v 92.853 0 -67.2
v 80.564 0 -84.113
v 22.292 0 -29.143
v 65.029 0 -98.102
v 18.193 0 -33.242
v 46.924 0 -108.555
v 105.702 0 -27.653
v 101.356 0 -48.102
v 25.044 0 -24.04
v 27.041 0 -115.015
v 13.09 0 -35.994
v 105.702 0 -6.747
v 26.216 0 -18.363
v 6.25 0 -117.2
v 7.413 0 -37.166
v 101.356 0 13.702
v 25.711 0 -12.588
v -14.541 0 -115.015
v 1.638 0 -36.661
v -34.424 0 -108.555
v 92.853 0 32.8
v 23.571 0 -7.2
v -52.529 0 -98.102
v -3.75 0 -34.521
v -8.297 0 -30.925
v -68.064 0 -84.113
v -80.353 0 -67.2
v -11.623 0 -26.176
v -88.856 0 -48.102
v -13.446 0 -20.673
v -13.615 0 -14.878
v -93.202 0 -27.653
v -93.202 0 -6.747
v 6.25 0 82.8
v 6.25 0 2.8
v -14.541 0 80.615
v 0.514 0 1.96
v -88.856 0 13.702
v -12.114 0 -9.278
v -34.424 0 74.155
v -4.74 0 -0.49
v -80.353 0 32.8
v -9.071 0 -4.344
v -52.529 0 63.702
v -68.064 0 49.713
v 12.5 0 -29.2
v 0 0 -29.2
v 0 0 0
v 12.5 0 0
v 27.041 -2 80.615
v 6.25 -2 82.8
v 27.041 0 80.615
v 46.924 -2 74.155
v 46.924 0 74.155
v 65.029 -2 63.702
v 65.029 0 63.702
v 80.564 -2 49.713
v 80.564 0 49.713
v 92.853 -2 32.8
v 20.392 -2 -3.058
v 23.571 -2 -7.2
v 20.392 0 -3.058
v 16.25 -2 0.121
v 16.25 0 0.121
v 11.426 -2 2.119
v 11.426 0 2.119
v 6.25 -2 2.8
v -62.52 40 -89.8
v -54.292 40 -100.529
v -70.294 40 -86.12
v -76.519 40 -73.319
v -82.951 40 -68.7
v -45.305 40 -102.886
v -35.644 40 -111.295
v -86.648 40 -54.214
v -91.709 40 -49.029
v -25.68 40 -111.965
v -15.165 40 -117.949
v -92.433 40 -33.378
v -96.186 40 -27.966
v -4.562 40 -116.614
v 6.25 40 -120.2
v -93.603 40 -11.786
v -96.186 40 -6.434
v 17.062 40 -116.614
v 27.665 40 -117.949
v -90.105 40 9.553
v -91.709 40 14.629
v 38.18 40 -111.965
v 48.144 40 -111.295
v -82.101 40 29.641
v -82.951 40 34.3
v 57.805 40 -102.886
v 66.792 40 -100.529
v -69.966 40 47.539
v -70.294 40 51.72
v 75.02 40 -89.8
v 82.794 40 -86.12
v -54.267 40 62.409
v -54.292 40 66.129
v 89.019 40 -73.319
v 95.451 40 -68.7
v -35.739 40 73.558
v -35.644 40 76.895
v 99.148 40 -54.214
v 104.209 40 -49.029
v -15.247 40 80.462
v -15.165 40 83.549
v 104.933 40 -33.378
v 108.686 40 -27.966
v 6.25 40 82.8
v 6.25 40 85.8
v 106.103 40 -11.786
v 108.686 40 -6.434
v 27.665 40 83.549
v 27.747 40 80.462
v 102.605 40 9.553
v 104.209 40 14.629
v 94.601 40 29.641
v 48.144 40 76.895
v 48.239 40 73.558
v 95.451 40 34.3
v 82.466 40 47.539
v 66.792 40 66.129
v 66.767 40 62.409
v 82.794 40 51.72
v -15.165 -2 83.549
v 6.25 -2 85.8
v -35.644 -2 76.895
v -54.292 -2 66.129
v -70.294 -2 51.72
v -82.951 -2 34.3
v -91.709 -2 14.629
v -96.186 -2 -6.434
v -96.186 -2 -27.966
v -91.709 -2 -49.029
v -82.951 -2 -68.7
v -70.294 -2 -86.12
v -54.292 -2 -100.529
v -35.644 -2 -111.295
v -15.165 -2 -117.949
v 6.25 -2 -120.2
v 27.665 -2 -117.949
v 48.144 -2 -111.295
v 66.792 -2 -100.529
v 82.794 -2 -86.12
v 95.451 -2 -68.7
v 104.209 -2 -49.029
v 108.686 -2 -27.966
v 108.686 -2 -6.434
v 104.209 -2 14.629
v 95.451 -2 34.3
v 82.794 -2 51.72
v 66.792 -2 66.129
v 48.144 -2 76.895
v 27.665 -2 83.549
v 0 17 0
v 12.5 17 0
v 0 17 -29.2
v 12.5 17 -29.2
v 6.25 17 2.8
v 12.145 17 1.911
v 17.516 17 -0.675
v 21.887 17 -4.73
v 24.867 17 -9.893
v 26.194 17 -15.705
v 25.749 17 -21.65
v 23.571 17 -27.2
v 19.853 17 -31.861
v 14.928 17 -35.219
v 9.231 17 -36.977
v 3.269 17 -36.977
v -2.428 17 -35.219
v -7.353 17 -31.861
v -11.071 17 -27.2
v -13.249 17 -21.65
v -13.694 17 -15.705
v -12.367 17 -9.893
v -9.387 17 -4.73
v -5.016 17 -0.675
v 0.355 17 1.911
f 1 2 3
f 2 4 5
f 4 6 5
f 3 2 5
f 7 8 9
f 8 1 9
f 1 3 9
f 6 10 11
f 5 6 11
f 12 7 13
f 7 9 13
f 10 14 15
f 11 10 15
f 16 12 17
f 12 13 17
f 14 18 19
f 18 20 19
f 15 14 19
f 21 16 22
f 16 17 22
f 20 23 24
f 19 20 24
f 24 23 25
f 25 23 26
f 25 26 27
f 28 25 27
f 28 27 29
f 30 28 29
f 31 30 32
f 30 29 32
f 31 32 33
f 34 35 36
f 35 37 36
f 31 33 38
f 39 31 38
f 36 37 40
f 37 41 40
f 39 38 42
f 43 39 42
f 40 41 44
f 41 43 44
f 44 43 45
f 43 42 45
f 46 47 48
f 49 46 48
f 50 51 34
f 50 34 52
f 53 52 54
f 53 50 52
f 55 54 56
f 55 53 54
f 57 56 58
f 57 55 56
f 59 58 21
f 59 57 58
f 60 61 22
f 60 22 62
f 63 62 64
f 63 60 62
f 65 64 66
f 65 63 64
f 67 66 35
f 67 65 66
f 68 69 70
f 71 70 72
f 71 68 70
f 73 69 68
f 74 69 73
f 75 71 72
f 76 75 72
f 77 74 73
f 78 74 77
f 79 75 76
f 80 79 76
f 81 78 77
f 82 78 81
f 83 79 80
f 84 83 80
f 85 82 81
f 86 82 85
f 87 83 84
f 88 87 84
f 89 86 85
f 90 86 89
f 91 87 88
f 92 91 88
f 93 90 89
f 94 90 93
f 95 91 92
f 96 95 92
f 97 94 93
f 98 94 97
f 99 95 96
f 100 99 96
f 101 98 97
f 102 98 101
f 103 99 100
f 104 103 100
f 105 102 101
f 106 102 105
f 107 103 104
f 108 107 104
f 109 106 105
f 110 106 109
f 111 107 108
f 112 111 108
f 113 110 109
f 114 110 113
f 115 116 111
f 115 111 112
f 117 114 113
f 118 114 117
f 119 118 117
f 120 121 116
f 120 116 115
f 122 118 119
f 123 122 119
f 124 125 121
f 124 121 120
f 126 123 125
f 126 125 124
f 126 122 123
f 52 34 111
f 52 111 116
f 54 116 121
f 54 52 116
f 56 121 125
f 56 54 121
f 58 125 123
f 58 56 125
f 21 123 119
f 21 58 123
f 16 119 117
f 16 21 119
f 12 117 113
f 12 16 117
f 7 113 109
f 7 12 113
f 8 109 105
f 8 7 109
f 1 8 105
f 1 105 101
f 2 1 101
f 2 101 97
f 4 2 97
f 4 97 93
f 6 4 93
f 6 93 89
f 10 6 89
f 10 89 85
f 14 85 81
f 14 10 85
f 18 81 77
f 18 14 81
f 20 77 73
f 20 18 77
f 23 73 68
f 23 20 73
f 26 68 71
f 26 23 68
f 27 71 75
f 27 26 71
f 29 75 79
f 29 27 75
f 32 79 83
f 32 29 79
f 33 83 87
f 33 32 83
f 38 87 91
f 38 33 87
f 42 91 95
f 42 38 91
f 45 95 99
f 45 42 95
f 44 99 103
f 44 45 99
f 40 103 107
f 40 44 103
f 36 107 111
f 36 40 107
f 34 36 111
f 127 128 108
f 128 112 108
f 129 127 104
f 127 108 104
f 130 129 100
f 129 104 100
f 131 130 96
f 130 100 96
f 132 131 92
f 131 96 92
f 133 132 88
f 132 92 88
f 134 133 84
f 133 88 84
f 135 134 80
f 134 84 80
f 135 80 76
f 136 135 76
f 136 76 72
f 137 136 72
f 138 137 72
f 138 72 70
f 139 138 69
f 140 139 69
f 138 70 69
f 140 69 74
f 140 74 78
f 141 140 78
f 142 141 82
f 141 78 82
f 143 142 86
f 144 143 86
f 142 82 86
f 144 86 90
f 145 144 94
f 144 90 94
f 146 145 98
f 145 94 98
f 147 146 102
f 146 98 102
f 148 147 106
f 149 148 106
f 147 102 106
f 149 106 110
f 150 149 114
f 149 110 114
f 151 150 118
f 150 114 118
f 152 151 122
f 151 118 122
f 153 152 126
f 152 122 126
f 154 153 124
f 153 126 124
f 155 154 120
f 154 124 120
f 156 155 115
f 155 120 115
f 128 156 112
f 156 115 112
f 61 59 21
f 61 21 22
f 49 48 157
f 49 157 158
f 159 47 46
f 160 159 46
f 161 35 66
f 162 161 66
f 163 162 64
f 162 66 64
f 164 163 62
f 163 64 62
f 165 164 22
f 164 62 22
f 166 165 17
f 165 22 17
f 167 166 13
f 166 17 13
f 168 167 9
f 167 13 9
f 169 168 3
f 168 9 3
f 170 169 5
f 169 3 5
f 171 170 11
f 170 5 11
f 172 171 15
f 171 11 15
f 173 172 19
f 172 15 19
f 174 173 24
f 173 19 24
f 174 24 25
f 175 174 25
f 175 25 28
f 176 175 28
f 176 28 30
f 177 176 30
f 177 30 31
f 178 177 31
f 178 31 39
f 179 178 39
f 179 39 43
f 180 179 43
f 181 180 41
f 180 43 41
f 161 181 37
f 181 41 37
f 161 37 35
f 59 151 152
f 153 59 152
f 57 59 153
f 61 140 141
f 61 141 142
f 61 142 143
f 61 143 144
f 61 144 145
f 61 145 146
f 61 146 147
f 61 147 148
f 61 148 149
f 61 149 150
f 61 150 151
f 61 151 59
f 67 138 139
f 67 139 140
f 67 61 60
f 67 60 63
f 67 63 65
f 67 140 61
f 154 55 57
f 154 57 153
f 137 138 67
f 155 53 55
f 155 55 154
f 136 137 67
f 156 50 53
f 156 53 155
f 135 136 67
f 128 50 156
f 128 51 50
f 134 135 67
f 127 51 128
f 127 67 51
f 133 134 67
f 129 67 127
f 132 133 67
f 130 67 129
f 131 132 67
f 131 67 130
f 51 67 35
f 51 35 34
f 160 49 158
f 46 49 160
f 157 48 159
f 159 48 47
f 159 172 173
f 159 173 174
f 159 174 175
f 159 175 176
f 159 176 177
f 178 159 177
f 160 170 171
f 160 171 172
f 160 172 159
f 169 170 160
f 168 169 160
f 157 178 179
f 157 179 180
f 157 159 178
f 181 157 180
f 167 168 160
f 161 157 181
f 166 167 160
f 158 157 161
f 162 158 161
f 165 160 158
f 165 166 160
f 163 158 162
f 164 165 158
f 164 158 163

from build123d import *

# Parameters (mm, degrees)
SKETCH_1_R          = 20
SKETCH_1_W          = 12.5
SKETCH_1_H          = 29.2
EXTRUDE_1_DEPTH     = 17
SKETCH_1_4_R        = 103
SKETCH_1_4_R_2      = 100
EXTRUDE_2_DEPTH     = 40
SKETCH_3_R          = 103
EXTRUDE_4_DEPTH     = 2
CUT_EXTRUDE_START   = -2
CUT_EXTRUDE_2_DEPTH = 2


# Read off the part's stored shape, not the designer's step: 切除-拉伸2
with BuildPart() as part:
    # 草图1 → 凸台-拉伸1 (new body)
    with BuildSketch(Plane(origin=(0, 0, 0), x_dir=(1, 0, 0), z_dir=(0, 1, 0))):
        with Locations(Location((6.25, 17.2, 0), (0, 0, 270))):
            Circle(SKETCH_1_R)
        with Locations((6.25, 14.6)):
            Rectangle(SKETCH_1_W, SKETCH_1_H, mode=Mode.SUBTRACT)
    extrude(amount=EXTRUDE_1_DEPTH)



with BuildPart() as body_2:
    # 草图1<4> → 凸台-拉伸2 (new body)
    with BuildSketch(Plane(origin=(0, 0, 0), x_dir=(1, 0, 0), z_dir=(0, 1, 0))):
        with Locations(Location((6.25, 17.2, 0), (0, 0, 270))):
            Circle(SKETCH_1_4_R)
        with Locations(Location((6.25, 17.2, 0), (0, 0, 270))):
            Circle(SKETCH_1_4_R_2, mode=Mode.SUBTRACT)
    extrude(amount=EXTRUDE_2_DEPTH)


with BuildPart() as part_1:
    add(part.part)

    add(body_2.part)  # 凸台-拉伸4 merges body 2
    # 草图3 → 凸台-拉伸4 (add)
    with BuildSketch(Plane.XZ):
        with Locations(Location((6.25, -17.2, 0), (0, 0, 90))):
            Circle(SKETCH_3_R)
    extrude(amount=EXTRUDE_4_DEPTH)

    # 切除-拉伸2 outline → 切除-拉伸2 (cut)
    with BuildSketch(Plane(origin=(0, 0, 0), x_dir=(1, 0, 0), z_dir=(0, 1, 0)).offset(CUT_EXTRUDE_START)):
        with BuildLine():
            Line((92.852540378, -32.8), (23.570508076, 7.2))
            ThreePointArc((23.570508076, 7.2), (16.25, -0.120508076), (6.25, -2.8))
            Line((6.25, -2.8), (6.25, -82.8))
            ThreePointArc((6.25, -82.8), (56.25, -69.402540378), (92.852540378, -32.8))
        make_face()
    extrude(amount=CUT_EXTRUDE_2_DEPTH, mode=Mode.SUBTRACT)


solid = part_1.part
